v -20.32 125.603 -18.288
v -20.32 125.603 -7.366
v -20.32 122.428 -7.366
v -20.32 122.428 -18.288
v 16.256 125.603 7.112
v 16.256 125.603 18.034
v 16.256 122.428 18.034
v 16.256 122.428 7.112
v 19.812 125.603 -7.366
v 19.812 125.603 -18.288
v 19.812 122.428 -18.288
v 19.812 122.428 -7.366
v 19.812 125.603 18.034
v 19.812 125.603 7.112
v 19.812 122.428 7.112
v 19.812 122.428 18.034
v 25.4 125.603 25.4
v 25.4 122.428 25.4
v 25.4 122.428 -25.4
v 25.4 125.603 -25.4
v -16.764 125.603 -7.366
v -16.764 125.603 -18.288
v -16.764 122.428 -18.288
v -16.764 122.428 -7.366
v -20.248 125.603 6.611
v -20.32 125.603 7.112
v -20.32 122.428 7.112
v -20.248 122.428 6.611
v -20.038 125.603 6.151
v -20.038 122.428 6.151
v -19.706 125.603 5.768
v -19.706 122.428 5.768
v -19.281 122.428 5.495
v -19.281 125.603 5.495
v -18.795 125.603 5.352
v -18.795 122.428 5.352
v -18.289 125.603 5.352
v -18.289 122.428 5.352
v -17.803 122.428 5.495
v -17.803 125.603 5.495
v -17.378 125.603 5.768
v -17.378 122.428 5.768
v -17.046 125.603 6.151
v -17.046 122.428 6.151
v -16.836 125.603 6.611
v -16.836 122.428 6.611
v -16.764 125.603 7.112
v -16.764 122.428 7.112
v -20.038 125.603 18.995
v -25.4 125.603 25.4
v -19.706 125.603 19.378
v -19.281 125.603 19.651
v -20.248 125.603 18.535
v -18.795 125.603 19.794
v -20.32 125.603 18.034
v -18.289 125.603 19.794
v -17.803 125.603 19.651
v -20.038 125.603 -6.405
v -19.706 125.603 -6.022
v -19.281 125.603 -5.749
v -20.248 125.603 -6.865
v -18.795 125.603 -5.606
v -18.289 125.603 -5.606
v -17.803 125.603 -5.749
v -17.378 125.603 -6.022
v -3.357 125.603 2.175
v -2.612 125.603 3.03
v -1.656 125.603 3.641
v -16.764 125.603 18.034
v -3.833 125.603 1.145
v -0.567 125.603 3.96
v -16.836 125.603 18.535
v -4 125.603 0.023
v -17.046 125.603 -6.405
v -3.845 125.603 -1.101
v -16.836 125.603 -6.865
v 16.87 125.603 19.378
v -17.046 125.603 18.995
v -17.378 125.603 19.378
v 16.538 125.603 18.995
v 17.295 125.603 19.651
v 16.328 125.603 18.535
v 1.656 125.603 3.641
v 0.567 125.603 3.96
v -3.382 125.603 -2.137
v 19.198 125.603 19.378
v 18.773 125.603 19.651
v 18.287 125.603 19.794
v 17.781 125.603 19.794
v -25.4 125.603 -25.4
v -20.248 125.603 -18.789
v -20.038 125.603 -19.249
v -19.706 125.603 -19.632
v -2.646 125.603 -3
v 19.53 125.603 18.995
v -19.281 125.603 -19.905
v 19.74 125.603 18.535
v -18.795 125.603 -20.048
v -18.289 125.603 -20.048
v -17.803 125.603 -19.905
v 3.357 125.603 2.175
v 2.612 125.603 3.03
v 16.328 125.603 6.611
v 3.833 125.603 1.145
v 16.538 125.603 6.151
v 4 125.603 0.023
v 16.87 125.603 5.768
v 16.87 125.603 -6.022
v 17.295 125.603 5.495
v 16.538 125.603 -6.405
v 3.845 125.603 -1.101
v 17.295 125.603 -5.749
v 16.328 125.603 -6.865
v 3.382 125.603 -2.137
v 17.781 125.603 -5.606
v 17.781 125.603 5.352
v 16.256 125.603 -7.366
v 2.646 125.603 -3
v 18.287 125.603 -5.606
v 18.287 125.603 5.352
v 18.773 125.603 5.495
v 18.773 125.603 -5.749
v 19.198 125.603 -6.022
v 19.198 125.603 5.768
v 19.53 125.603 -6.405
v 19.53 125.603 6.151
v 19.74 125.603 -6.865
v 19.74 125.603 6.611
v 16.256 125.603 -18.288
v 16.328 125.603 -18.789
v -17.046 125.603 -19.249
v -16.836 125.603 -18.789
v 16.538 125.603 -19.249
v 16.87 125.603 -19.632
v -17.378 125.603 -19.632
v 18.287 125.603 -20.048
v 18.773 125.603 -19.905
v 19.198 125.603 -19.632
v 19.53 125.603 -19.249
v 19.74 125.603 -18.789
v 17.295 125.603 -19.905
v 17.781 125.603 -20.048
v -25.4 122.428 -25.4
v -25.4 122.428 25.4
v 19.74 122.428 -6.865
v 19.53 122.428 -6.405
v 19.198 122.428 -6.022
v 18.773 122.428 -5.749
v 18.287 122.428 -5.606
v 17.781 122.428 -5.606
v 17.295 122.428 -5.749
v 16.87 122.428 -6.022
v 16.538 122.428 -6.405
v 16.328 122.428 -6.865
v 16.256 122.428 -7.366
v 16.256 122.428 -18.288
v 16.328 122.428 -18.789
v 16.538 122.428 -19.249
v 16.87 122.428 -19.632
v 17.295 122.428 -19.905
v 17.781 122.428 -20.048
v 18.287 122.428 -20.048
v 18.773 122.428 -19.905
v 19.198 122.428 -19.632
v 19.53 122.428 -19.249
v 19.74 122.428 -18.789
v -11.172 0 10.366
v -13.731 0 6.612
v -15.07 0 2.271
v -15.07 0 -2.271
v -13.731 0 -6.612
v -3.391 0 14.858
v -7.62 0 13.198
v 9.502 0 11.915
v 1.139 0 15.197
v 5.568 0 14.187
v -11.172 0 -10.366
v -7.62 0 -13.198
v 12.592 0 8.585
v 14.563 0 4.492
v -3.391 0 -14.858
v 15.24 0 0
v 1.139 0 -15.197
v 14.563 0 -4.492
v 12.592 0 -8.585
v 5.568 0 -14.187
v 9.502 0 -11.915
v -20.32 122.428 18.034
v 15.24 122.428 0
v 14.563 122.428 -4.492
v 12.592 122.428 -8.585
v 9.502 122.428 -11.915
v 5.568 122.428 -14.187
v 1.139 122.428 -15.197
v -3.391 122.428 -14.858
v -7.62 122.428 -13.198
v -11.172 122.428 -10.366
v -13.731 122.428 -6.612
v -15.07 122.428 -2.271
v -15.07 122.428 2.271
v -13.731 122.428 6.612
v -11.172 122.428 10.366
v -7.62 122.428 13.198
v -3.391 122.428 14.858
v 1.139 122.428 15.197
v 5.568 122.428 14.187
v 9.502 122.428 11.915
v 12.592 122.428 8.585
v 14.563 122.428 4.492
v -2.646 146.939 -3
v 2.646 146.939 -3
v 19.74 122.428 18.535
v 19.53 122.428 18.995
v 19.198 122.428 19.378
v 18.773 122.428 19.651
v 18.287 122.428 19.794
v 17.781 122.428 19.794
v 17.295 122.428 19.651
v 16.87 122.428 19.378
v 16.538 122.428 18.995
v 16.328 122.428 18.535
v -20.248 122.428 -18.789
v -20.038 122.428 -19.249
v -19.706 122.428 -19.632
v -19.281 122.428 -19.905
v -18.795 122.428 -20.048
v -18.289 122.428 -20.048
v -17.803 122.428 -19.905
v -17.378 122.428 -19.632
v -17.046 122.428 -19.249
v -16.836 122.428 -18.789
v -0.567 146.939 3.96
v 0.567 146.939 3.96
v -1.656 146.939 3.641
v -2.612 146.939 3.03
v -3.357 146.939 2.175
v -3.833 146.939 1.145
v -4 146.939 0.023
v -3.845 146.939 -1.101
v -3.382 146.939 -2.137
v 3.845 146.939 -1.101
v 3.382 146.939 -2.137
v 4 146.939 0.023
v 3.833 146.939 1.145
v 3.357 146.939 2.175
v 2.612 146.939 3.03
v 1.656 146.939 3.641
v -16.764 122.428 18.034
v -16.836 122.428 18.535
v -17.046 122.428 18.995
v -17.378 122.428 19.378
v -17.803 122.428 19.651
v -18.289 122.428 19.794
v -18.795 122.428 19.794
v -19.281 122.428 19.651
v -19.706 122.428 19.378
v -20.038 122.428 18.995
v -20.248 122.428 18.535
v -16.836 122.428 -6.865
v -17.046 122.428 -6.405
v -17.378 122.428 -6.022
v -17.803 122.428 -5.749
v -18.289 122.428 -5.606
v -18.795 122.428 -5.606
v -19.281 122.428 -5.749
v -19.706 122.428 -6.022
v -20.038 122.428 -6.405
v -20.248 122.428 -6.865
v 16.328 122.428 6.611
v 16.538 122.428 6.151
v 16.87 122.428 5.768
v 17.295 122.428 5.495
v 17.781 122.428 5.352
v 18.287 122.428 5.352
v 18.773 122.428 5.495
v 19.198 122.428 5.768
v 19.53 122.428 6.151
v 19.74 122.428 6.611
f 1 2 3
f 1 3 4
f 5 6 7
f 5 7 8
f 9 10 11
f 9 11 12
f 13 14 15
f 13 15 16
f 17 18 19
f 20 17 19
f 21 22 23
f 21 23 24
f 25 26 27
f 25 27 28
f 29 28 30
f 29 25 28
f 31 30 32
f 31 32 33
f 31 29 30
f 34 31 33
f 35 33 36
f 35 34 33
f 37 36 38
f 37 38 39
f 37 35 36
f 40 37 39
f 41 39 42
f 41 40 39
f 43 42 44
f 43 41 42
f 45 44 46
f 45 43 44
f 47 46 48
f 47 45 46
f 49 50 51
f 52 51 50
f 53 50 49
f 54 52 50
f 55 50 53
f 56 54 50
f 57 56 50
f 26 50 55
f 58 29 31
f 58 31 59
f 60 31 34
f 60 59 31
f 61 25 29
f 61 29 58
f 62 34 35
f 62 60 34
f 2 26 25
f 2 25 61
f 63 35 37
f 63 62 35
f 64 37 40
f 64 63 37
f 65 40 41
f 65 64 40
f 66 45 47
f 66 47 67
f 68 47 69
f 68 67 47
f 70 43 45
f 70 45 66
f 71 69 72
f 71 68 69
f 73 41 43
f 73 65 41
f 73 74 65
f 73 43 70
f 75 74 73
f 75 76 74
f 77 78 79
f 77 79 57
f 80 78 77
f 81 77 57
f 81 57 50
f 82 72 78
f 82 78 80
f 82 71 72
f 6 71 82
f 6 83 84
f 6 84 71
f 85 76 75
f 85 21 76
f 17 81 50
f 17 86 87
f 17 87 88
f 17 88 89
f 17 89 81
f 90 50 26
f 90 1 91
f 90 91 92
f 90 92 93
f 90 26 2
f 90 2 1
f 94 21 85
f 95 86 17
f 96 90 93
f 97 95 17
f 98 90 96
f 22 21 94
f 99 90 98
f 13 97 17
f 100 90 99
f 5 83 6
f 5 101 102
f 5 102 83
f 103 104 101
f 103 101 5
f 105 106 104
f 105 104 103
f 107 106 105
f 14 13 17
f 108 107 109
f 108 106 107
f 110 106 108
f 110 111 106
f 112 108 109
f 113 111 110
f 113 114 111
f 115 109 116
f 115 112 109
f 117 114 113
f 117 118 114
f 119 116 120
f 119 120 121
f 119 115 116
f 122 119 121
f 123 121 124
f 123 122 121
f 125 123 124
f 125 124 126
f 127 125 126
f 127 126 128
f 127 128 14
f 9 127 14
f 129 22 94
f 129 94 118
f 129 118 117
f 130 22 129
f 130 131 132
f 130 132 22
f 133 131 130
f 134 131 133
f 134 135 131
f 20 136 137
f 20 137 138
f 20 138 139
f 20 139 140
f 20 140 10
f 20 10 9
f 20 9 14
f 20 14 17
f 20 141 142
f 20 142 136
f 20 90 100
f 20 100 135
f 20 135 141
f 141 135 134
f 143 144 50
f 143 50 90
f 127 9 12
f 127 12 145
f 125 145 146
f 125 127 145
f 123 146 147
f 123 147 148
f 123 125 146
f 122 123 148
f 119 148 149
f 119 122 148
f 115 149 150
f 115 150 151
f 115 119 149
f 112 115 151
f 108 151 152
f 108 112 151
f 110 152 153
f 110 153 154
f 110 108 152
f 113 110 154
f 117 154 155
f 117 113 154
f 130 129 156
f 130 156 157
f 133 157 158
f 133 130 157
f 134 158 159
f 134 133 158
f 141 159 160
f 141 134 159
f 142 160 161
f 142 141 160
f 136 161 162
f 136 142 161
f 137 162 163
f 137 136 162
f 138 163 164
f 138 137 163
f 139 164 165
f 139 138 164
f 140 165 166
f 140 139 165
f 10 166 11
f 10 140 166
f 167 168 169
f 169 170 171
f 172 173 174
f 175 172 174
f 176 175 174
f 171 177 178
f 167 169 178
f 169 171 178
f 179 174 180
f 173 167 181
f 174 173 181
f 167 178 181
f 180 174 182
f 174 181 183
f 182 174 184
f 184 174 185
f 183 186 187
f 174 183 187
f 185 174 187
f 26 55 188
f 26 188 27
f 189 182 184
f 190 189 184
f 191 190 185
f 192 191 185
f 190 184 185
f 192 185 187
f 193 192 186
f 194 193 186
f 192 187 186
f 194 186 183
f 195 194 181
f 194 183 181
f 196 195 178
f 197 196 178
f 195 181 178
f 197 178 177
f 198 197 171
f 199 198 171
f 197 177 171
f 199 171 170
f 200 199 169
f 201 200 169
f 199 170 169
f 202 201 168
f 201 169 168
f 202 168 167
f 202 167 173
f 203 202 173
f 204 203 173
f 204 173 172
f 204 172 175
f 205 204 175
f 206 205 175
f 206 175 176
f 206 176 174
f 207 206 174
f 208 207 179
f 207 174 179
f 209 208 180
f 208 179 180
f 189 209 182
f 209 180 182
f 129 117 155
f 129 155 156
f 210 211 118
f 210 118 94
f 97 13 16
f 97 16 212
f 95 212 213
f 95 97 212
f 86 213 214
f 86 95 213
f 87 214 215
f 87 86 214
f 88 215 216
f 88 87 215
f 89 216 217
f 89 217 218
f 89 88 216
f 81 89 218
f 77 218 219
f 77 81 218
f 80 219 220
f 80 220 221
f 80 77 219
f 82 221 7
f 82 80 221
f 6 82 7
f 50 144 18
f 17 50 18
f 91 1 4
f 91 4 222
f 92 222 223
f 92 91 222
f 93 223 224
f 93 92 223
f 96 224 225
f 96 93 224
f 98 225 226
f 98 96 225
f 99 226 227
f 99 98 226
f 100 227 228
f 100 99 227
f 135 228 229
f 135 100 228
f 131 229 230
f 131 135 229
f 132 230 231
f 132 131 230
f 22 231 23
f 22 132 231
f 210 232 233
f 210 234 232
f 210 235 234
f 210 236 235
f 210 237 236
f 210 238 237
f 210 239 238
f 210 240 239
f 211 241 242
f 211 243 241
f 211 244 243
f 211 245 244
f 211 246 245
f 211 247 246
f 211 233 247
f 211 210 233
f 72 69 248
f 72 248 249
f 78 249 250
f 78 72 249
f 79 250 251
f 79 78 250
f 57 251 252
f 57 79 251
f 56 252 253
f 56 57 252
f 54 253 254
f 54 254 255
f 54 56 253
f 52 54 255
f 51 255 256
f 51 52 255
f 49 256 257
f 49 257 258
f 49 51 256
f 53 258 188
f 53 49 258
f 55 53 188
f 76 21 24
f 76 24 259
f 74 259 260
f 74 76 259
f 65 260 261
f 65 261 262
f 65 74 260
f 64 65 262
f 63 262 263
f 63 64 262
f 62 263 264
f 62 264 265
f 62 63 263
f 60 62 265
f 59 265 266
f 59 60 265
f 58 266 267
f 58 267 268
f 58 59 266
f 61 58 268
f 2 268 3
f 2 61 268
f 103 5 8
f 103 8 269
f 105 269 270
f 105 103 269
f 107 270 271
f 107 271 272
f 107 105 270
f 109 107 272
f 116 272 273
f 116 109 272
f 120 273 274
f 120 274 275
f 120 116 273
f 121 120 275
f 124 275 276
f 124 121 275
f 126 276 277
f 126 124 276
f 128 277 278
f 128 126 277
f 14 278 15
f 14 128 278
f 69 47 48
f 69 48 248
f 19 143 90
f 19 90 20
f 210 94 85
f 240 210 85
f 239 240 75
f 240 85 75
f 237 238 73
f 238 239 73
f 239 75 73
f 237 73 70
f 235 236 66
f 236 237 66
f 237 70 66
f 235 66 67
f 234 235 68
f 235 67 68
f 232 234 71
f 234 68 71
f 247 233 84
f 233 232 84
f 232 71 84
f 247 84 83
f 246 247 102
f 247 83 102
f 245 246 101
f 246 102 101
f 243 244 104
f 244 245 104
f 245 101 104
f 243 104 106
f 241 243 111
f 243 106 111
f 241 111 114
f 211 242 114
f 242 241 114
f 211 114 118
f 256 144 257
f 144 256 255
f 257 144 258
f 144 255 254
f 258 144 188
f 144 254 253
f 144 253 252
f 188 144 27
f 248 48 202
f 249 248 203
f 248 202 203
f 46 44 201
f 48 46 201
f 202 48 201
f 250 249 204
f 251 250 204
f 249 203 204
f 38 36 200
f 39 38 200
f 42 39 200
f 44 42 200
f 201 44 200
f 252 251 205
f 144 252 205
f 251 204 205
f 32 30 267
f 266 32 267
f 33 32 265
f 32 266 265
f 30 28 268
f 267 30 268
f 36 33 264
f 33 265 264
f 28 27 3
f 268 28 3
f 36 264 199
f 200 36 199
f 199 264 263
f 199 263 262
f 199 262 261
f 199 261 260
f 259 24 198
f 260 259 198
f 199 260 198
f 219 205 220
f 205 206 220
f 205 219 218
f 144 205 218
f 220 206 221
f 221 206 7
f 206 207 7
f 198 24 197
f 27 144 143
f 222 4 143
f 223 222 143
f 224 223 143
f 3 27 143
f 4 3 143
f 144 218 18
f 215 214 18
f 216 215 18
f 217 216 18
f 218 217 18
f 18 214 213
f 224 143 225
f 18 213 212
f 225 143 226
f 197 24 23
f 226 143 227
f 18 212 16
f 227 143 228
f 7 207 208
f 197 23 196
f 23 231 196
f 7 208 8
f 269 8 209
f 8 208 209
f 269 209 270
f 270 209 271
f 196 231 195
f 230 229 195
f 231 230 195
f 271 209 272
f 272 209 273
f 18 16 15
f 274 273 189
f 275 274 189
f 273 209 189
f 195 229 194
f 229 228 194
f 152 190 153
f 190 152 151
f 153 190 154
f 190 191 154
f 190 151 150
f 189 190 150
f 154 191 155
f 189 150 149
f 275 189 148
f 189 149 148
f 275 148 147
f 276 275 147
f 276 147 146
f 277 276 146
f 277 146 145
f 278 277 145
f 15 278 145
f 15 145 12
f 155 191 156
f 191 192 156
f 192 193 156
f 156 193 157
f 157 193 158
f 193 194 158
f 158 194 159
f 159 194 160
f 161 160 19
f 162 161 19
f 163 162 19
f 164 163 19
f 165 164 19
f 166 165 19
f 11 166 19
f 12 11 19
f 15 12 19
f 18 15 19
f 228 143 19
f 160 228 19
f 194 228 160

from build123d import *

# Parameters (mm, degrees)
SKETCH1_R           = 15.24
BOSS_EXTRUDE1_DEPTH = 122.428
SKETCH2_W           = 50.8
SKETCH2_H           = 50.8
BOSS_EXTRUDE2_DEPTH = 3.175
SKETCH3_R           = 4
BOSS_EXTRUDE3_DEPTH = 21.336
CUT_EXTRUDE1_DEPTH  = 21.336
CUT_EXTRUDE2_DEPTH  = 3.175


with BuildPart() as part:
    # Sketch1 → Boss-Extrude1 (new body)
    with BuildSketch(Plane(origin=(0, 0, 0), x_dir=(1, 0, 0), z_dir=(0, 1, 0))):
        Circle(SKETCH1_R)
    extrude(amount=BOSS_EXTRUDE1_DEPTH)

    # Sketch2 → Boss-Extrude2 (add)
    with BuildSketch(Plane(origin=(0, 122.428, 0), x_dir=(1, 0, 0), z_dir=(0, 1, 0))):
        Rectangle(SKETCH2_W, SKETCH2_H)
    extrude(amount=BOSS_EXTRUDE2_DEPTH)

    # Sketch3 → Boss-Extrude3 (add)
    with BuildSketch(Plane(origin=(0, 125.603, 0), x_dir=(1, 0, 0), z_dir=(0, 1, 0))):
        Circle(SKETCH3_R)
    extrude(amount=BOSS_EXTRUDE3_DEPTH)

    # Sketch4 → Cut-Extrude1 (cut)
    with BuildSketch(Plane(origin=(0, 146.939, 0), x_dir=(1, 0, 0), z_dir=(0, 1, 0))):
        with BuildLine():
            Line((2.645751311, 3), (-2.645751311, 3))
            ThreePointArc((-2.645751311, 3), (0, 4), (2.645751311, 3))
        make_face()
    extrude(amount=-CUT_EXTRUDE1_DEPTH, mode=Mode.SUBTRACT)

    # Sketch5 → Cut-Extrude2 (cut)
    with BuildSketch(Plane(origin=(0, 125.603, 0), x_dir=(1, 0, 0), z_dir=(0, 1, 0))):
        with BuildLine():
            Line((-16.764, 18.288), (-16.764, 7.366))
            ThreePointArc((-16.764, 7.366), (-18.542, 5.588), (-20.32, 7.366))
            Line((-20.32, 7.366), (-20.32, 18.288))
            ThreePointArc((-20.32, 18.288), (-18.542, 20.066), (-16.764, 18.288))
        make_face()
        with BuildLine():
            Line((-16.764, -7.112), (-16.764, -18.034))
            ThreePointArc((-16.764, -18.034), (-18.542, -19.812), (-20.32, -18.034))
            Line((-20.32, -18.034), (-20.32, -7.112))
            ThreePointArc((-20.32, -7.112), (-18.542, -5.334), (-16.764, -7.112))
        make_face()
        with BuildLine():
            Line((19.812, -7.112), (19.812, -18.034))
            ThreePointArc((19.812, -18.034), (18.034, -19.812), (16.256, -18.034))
            Line((16.256, -18.034), (16.256, -7.112))
            ThreePointArc((16.256, -7.112), (18.034, -5.334), (19.812, -7.112))
        make_face()
        with BuildLine():
            Line((19.812, 18.288), (19.812, 7.366))
            ThreePointArc((19.812, 7.366), (18.034, 5.588), (16.256, 7.366))
            Line((16.256, 7.366), (16.256, 18.288))
            ThreePointArc((16.256, 18.288), (18.034, 20.066), (19.812, 18.288))
        make_face()
    extrude(amount=-CUT_EXTRUDE2_DEPTH, mode=Mode.SUBTRACT)


solid = part.part
